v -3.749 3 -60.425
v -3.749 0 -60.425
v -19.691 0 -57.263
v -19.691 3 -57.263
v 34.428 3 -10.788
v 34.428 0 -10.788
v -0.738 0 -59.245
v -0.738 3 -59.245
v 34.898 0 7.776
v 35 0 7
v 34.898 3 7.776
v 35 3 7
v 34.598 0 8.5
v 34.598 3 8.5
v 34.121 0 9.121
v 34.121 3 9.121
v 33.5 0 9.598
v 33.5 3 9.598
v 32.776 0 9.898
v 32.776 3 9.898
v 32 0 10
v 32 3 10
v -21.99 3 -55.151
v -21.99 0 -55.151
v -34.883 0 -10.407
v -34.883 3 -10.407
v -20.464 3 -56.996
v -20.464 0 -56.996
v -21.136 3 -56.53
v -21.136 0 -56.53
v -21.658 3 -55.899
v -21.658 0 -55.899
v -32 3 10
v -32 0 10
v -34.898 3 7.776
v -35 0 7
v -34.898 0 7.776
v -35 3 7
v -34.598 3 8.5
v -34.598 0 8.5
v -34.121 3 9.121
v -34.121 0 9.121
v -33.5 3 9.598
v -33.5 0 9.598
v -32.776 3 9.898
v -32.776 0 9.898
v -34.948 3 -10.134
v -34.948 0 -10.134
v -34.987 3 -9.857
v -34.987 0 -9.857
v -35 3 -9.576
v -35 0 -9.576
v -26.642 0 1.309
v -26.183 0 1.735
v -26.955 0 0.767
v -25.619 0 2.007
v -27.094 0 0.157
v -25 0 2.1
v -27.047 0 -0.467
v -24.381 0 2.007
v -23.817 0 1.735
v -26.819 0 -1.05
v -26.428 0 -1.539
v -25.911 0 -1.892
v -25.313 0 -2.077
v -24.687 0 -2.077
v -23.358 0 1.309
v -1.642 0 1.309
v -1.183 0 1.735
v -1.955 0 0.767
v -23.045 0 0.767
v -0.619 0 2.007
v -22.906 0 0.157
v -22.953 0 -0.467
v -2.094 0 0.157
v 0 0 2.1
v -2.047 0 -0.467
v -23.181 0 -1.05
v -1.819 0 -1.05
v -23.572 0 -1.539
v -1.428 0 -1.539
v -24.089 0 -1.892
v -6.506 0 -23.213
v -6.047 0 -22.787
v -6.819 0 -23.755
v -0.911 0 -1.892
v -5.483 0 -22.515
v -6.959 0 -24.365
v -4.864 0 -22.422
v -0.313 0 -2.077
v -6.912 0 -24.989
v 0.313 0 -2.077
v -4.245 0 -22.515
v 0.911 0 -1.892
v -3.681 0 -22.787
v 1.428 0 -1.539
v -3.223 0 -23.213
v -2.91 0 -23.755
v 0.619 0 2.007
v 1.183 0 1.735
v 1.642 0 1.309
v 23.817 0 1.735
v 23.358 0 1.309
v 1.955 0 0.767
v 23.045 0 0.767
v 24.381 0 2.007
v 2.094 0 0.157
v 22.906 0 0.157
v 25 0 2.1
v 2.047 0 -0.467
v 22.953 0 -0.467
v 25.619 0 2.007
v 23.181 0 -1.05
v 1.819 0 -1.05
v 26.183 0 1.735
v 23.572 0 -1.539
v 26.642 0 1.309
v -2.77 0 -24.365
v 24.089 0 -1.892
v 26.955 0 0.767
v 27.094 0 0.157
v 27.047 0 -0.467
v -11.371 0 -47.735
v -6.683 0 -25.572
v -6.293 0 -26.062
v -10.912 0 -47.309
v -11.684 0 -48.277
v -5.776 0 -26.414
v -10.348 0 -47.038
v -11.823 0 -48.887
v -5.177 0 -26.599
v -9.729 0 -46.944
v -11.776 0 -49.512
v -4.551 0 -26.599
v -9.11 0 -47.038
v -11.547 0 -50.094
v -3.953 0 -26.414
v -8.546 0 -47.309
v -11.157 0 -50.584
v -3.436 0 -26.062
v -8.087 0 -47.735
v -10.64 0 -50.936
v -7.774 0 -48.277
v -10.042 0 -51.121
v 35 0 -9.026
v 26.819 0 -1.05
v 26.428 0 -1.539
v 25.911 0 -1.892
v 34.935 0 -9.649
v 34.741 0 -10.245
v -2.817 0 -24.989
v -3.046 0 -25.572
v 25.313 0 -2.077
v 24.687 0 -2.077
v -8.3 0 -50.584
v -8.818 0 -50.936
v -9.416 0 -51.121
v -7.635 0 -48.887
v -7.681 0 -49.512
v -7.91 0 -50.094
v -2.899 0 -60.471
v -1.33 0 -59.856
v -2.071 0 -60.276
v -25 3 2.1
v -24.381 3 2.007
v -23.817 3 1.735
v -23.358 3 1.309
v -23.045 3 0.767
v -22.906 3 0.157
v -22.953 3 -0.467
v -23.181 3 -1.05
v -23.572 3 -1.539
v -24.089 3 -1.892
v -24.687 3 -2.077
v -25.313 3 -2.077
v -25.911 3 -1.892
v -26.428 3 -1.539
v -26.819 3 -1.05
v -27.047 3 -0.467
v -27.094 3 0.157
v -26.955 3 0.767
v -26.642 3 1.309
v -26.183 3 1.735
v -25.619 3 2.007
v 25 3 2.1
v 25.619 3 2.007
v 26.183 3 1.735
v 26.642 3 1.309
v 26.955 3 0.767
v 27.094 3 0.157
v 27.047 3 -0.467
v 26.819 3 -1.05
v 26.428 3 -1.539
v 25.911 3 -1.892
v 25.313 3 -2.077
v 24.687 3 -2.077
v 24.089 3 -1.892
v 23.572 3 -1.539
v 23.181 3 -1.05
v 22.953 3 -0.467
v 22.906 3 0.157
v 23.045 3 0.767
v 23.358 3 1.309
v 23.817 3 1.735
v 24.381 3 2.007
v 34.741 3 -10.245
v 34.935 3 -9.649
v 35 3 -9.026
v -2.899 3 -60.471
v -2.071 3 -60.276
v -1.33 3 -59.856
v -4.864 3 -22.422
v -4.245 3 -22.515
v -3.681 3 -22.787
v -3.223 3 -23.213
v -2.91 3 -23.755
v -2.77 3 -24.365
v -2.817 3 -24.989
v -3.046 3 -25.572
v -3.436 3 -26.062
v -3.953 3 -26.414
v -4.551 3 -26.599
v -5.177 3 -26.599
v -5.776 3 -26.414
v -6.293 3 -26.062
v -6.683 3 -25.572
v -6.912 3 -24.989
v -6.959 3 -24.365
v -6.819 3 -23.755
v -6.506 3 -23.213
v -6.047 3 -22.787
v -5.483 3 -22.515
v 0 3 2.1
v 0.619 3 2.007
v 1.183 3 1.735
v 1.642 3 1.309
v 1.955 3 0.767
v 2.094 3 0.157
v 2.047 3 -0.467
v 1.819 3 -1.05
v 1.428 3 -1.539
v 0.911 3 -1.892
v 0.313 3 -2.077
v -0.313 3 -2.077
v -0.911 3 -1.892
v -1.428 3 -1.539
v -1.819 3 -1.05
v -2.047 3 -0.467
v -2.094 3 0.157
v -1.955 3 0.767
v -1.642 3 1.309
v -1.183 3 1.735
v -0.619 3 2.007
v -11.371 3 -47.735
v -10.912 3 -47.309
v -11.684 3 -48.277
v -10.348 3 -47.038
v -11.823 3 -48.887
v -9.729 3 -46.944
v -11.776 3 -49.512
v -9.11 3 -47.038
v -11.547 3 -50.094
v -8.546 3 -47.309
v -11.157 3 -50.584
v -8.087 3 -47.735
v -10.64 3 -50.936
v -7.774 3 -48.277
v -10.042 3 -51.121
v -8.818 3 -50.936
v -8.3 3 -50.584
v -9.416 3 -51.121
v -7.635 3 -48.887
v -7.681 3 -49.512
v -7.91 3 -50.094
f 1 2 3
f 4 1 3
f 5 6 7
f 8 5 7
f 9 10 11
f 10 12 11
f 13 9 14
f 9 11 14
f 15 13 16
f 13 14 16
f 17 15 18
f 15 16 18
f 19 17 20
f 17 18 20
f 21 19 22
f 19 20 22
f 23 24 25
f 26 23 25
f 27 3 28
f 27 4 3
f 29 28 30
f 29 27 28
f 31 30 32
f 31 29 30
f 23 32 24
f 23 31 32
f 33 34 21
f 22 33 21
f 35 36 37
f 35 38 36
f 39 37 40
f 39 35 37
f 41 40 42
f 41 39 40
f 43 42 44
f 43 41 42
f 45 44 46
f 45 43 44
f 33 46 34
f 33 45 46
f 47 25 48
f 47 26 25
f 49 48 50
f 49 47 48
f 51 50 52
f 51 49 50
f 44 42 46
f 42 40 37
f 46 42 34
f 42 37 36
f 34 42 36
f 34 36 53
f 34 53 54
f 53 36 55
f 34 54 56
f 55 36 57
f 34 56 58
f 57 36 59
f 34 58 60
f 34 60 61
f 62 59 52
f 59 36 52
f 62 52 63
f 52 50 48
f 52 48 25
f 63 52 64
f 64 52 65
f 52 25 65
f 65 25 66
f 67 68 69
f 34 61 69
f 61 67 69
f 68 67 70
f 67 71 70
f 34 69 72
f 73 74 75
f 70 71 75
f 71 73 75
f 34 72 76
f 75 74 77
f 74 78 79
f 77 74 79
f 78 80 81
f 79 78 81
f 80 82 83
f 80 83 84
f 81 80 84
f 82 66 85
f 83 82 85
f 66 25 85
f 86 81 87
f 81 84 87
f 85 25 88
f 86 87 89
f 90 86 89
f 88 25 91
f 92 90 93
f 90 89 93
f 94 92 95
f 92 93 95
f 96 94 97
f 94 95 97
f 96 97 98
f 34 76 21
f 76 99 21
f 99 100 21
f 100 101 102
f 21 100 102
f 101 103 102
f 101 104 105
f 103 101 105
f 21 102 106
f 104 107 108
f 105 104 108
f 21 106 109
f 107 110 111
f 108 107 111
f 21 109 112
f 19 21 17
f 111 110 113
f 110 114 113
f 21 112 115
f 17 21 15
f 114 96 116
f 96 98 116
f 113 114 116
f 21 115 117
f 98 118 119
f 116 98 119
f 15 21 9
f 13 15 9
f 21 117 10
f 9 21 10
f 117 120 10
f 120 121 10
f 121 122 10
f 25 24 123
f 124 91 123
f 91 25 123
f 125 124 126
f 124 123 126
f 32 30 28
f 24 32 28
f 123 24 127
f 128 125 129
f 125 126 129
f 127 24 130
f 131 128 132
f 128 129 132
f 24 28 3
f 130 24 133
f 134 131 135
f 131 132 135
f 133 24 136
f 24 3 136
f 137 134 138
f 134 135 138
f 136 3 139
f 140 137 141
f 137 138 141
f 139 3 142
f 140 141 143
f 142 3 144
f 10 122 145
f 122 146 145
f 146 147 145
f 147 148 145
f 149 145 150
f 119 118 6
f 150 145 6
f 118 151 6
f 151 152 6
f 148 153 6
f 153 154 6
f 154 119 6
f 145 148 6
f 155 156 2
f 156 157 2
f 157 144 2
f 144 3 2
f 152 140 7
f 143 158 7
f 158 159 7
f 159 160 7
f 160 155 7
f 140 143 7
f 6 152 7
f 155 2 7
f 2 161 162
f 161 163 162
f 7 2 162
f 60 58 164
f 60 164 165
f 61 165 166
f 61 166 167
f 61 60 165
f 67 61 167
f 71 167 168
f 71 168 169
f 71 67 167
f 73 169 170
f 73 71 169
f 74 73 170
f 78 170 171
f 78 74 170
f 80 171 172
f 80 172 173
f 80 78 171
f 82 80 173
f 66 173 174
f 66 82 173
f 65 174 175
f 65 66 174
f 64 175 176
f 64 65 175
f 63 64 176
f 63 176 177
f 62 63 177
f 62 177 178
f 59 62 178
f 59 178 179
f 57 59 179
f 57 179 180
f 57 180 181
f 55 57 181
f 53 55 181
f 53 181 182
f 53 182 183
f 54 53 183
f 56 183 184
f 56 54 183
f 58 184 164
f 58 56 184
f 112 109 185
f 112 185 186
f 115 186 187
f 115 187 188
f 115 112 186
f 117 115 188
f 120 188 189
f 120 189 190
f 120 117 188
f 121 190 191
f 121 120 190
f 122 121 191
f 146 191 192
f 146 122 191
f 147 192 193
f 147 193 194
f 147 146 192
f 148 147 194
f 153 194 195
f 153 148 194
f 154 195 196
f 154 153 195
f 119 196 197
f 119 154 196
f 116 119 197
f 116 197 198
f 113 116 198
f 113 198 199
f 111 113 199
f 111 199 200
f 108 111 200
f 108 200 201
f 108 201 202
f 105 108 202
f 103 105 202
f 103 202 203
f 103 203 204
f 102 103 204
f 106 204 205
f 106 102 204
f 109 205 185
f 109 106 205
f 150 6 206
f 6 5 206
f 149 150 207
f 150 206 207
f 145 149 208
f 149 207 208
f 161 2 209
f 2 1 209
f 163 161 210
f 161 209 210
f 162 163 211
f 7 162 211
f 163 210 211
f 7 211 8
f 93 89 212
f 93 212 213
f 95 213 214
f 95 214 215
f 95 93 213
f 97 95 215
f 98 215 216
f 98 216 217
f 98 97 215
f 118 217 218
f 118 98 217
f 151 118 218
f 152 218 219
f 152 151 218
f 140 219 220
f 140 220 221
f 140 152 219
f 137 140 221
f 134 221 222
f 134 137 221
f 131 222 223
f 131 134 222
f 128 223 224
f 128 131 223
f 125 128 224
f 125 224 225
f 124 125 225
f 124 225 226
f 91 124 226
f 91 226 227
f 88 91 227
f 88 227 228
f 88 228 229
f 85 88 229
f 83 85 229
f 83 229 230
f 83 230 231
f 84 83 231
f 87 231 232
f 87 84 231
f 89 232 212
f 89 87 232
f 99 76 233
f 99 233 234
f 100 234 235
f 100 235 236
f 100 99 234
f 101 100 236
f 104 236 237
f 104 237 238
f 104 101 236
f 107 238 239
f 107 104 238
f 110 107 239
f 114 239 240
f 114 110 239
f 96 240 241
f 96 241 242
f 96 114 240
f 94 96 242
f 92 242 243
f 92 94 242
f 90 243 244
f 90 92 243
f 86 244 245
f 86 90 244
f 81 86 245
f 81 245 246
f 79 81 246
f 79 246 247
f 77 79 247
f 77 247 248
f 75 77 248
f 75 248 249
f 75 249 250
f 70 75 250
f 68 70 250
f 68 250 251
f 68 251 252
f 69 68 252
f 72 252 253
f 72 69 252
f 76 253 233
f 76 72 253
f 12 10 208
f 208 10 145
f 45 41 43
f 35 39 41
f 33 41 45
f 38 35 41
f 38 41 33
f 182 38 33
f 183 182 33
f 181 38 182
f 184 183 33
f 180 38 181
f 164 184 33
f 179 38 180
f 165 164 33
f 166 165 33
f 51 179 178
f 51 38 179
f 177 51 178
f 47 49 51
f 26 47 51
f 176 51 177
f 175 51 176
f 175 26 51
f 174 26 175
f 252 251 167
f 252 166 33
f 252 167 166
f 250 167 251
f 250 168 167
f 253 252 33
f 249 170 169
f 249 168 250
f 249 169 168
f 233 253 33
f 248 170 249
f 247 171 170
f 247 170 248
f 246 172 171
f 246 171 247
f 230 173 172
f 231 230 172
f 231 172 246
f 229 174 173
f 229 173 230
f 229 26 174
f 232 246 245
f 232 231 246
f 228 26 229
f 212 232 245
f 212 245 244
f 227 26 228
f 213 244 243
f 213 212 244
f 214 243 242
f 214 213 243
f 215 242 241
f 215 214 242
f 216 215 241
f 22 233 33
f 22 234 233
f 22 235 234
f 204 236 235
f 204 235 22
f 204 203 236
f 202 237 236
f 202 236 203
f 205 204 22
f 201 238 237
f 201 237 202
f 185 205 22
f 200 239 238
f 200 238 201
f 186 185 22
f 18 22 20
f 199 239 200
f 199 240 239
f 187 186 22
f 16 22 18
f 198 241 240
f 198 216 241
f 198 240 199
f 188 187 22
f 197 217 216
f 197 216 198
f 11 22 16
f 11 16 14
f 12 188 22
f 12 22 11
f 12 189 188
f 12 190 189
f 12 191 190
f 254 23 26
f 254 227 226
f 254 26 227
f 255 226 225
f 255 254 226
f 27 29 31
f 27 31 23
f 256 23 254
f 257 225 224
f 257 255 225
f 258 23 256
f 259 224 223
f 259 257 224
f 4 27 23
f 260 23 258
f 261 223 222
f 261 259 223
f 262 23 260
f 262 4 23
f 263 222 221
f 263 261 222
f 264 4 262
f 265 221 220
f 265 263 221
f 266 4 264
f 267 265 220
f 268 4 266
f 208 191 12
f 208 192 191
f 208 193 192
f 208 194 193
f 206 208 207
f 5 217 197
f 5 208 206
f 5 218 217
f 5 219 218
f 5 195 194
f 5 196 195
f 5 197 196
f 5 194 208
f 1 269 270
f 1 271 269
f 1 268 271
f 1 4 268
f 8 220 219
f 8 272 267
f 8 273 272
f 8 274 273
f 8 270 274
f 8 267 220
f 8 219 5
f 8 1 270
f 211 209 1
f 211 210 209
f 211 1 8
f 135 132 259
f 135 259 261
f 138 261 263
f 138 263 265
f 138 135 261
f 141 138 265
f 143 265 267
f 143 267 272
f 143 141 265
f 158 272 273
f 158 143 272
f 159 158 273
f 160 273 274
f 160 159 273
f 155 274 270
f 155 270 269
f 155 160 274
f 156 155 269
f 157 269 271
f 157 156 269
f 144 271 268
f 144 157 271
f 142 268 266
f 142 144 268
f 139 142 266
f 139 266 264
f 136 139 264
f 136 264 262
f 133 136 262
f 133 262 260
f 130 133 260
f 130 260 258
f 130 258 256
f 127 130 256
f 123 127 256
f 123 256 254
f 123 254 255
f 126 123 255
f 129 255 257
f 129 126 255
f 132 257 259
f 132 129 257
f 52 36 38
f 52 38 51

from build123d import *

# Parameters (mm, degrees)
SKETCH_1_W      = 70
SKETCH_1_H      = 20
SKETCH_1_R      = 2.1
EXTRUDE_1_DEPTH = 3
FILLET_1_R      = 3


with BuildPart() as part:
    # 草图1 → 凸台-拉伸1 (new body)
    # profile 1 of 4: a face of its own
    with BuildSketch(Plane(origin=(0, 0, 0), x_dir=(1, 0, 0), z_dir=(0, 1, 0))):
        Polygon((-1.865732489, 60.799005274), (8.211170098, 10), (35, 10), align=None)
    # profile 2 of 4: a face of its own
    with BuildSketch(Plane(origin=(0, 0, 0), x_dir=(1, 0, 0), z_dir=(0, 1, 0))):
        Rectangle(SKETCH_1_W, SKETCH_1_H)
        with Locations(Location((-25, 0, 0), (0, 0, 270))):
            Circle(SKETCH_1_R, mode=Mode.SUBTRACT)
        with Locations(Location((25, 0, 0), (0, 0, 270))):
            Circle(SKETCH_1_R, mode=Mode.SUBTRACT)
        with Locations(Location((0, 0, 0), (0, 0, 270))):
            Circle(SKETCH_1_R, mode=Mode.SUBTRACT)
    # profile 3 of 4: a face of its own
    with BuildSketch(Plane(origin=(0, 0, 0), x_dir=(1, 0, 0), z_dir=(0, 1, 0))):
        Polygon((-35, 10), (-12.178532268, 10), (-21.48347839, 56.907470127), align=None)
    # profile 4 of 4: a face of its own
    with BuildSketch(Plane(origin=(0, 0, 0), x_dir=(1, 0, 0), z_dir=(0, 1, 0))):
        Polygon((-12.178532268, 10), (8.211170098, 10), (-1.865732489, 60.799005274), (-21.48347839, 56.907470127), align=None)
        with Locations(Location((-4.864418933, 24.522182375, 0), (0, 0, 270))):
            Circle(SKETCH_1_R, mode=Mode.SUBTRACT)
        with Locations(Location((-9.728837866, 49.04436475, 0), (0, 0, 270))):
            Circle(SKETCH_1_R, mode=Mode.SUBTRACT)
    extrude(amount=EXTRUDE_1_DEPTH)

    # 圆角1
    fillet_1_edges = [part.edges().sort_by_distance(p)[0] for p in [
        (-1.865732489, 1.5, -60.799005274),
        (35, 1.5, -10),
        (35, 1.5, 10),
        (-35, 1.5, 10),
        (-35, 1.5, -10),
        (-21.48347839, 1.5, -56.907470127),
    ]]
    fillet(fillet_1_edges, radius=FILLET_1_R)


solid = part.part
